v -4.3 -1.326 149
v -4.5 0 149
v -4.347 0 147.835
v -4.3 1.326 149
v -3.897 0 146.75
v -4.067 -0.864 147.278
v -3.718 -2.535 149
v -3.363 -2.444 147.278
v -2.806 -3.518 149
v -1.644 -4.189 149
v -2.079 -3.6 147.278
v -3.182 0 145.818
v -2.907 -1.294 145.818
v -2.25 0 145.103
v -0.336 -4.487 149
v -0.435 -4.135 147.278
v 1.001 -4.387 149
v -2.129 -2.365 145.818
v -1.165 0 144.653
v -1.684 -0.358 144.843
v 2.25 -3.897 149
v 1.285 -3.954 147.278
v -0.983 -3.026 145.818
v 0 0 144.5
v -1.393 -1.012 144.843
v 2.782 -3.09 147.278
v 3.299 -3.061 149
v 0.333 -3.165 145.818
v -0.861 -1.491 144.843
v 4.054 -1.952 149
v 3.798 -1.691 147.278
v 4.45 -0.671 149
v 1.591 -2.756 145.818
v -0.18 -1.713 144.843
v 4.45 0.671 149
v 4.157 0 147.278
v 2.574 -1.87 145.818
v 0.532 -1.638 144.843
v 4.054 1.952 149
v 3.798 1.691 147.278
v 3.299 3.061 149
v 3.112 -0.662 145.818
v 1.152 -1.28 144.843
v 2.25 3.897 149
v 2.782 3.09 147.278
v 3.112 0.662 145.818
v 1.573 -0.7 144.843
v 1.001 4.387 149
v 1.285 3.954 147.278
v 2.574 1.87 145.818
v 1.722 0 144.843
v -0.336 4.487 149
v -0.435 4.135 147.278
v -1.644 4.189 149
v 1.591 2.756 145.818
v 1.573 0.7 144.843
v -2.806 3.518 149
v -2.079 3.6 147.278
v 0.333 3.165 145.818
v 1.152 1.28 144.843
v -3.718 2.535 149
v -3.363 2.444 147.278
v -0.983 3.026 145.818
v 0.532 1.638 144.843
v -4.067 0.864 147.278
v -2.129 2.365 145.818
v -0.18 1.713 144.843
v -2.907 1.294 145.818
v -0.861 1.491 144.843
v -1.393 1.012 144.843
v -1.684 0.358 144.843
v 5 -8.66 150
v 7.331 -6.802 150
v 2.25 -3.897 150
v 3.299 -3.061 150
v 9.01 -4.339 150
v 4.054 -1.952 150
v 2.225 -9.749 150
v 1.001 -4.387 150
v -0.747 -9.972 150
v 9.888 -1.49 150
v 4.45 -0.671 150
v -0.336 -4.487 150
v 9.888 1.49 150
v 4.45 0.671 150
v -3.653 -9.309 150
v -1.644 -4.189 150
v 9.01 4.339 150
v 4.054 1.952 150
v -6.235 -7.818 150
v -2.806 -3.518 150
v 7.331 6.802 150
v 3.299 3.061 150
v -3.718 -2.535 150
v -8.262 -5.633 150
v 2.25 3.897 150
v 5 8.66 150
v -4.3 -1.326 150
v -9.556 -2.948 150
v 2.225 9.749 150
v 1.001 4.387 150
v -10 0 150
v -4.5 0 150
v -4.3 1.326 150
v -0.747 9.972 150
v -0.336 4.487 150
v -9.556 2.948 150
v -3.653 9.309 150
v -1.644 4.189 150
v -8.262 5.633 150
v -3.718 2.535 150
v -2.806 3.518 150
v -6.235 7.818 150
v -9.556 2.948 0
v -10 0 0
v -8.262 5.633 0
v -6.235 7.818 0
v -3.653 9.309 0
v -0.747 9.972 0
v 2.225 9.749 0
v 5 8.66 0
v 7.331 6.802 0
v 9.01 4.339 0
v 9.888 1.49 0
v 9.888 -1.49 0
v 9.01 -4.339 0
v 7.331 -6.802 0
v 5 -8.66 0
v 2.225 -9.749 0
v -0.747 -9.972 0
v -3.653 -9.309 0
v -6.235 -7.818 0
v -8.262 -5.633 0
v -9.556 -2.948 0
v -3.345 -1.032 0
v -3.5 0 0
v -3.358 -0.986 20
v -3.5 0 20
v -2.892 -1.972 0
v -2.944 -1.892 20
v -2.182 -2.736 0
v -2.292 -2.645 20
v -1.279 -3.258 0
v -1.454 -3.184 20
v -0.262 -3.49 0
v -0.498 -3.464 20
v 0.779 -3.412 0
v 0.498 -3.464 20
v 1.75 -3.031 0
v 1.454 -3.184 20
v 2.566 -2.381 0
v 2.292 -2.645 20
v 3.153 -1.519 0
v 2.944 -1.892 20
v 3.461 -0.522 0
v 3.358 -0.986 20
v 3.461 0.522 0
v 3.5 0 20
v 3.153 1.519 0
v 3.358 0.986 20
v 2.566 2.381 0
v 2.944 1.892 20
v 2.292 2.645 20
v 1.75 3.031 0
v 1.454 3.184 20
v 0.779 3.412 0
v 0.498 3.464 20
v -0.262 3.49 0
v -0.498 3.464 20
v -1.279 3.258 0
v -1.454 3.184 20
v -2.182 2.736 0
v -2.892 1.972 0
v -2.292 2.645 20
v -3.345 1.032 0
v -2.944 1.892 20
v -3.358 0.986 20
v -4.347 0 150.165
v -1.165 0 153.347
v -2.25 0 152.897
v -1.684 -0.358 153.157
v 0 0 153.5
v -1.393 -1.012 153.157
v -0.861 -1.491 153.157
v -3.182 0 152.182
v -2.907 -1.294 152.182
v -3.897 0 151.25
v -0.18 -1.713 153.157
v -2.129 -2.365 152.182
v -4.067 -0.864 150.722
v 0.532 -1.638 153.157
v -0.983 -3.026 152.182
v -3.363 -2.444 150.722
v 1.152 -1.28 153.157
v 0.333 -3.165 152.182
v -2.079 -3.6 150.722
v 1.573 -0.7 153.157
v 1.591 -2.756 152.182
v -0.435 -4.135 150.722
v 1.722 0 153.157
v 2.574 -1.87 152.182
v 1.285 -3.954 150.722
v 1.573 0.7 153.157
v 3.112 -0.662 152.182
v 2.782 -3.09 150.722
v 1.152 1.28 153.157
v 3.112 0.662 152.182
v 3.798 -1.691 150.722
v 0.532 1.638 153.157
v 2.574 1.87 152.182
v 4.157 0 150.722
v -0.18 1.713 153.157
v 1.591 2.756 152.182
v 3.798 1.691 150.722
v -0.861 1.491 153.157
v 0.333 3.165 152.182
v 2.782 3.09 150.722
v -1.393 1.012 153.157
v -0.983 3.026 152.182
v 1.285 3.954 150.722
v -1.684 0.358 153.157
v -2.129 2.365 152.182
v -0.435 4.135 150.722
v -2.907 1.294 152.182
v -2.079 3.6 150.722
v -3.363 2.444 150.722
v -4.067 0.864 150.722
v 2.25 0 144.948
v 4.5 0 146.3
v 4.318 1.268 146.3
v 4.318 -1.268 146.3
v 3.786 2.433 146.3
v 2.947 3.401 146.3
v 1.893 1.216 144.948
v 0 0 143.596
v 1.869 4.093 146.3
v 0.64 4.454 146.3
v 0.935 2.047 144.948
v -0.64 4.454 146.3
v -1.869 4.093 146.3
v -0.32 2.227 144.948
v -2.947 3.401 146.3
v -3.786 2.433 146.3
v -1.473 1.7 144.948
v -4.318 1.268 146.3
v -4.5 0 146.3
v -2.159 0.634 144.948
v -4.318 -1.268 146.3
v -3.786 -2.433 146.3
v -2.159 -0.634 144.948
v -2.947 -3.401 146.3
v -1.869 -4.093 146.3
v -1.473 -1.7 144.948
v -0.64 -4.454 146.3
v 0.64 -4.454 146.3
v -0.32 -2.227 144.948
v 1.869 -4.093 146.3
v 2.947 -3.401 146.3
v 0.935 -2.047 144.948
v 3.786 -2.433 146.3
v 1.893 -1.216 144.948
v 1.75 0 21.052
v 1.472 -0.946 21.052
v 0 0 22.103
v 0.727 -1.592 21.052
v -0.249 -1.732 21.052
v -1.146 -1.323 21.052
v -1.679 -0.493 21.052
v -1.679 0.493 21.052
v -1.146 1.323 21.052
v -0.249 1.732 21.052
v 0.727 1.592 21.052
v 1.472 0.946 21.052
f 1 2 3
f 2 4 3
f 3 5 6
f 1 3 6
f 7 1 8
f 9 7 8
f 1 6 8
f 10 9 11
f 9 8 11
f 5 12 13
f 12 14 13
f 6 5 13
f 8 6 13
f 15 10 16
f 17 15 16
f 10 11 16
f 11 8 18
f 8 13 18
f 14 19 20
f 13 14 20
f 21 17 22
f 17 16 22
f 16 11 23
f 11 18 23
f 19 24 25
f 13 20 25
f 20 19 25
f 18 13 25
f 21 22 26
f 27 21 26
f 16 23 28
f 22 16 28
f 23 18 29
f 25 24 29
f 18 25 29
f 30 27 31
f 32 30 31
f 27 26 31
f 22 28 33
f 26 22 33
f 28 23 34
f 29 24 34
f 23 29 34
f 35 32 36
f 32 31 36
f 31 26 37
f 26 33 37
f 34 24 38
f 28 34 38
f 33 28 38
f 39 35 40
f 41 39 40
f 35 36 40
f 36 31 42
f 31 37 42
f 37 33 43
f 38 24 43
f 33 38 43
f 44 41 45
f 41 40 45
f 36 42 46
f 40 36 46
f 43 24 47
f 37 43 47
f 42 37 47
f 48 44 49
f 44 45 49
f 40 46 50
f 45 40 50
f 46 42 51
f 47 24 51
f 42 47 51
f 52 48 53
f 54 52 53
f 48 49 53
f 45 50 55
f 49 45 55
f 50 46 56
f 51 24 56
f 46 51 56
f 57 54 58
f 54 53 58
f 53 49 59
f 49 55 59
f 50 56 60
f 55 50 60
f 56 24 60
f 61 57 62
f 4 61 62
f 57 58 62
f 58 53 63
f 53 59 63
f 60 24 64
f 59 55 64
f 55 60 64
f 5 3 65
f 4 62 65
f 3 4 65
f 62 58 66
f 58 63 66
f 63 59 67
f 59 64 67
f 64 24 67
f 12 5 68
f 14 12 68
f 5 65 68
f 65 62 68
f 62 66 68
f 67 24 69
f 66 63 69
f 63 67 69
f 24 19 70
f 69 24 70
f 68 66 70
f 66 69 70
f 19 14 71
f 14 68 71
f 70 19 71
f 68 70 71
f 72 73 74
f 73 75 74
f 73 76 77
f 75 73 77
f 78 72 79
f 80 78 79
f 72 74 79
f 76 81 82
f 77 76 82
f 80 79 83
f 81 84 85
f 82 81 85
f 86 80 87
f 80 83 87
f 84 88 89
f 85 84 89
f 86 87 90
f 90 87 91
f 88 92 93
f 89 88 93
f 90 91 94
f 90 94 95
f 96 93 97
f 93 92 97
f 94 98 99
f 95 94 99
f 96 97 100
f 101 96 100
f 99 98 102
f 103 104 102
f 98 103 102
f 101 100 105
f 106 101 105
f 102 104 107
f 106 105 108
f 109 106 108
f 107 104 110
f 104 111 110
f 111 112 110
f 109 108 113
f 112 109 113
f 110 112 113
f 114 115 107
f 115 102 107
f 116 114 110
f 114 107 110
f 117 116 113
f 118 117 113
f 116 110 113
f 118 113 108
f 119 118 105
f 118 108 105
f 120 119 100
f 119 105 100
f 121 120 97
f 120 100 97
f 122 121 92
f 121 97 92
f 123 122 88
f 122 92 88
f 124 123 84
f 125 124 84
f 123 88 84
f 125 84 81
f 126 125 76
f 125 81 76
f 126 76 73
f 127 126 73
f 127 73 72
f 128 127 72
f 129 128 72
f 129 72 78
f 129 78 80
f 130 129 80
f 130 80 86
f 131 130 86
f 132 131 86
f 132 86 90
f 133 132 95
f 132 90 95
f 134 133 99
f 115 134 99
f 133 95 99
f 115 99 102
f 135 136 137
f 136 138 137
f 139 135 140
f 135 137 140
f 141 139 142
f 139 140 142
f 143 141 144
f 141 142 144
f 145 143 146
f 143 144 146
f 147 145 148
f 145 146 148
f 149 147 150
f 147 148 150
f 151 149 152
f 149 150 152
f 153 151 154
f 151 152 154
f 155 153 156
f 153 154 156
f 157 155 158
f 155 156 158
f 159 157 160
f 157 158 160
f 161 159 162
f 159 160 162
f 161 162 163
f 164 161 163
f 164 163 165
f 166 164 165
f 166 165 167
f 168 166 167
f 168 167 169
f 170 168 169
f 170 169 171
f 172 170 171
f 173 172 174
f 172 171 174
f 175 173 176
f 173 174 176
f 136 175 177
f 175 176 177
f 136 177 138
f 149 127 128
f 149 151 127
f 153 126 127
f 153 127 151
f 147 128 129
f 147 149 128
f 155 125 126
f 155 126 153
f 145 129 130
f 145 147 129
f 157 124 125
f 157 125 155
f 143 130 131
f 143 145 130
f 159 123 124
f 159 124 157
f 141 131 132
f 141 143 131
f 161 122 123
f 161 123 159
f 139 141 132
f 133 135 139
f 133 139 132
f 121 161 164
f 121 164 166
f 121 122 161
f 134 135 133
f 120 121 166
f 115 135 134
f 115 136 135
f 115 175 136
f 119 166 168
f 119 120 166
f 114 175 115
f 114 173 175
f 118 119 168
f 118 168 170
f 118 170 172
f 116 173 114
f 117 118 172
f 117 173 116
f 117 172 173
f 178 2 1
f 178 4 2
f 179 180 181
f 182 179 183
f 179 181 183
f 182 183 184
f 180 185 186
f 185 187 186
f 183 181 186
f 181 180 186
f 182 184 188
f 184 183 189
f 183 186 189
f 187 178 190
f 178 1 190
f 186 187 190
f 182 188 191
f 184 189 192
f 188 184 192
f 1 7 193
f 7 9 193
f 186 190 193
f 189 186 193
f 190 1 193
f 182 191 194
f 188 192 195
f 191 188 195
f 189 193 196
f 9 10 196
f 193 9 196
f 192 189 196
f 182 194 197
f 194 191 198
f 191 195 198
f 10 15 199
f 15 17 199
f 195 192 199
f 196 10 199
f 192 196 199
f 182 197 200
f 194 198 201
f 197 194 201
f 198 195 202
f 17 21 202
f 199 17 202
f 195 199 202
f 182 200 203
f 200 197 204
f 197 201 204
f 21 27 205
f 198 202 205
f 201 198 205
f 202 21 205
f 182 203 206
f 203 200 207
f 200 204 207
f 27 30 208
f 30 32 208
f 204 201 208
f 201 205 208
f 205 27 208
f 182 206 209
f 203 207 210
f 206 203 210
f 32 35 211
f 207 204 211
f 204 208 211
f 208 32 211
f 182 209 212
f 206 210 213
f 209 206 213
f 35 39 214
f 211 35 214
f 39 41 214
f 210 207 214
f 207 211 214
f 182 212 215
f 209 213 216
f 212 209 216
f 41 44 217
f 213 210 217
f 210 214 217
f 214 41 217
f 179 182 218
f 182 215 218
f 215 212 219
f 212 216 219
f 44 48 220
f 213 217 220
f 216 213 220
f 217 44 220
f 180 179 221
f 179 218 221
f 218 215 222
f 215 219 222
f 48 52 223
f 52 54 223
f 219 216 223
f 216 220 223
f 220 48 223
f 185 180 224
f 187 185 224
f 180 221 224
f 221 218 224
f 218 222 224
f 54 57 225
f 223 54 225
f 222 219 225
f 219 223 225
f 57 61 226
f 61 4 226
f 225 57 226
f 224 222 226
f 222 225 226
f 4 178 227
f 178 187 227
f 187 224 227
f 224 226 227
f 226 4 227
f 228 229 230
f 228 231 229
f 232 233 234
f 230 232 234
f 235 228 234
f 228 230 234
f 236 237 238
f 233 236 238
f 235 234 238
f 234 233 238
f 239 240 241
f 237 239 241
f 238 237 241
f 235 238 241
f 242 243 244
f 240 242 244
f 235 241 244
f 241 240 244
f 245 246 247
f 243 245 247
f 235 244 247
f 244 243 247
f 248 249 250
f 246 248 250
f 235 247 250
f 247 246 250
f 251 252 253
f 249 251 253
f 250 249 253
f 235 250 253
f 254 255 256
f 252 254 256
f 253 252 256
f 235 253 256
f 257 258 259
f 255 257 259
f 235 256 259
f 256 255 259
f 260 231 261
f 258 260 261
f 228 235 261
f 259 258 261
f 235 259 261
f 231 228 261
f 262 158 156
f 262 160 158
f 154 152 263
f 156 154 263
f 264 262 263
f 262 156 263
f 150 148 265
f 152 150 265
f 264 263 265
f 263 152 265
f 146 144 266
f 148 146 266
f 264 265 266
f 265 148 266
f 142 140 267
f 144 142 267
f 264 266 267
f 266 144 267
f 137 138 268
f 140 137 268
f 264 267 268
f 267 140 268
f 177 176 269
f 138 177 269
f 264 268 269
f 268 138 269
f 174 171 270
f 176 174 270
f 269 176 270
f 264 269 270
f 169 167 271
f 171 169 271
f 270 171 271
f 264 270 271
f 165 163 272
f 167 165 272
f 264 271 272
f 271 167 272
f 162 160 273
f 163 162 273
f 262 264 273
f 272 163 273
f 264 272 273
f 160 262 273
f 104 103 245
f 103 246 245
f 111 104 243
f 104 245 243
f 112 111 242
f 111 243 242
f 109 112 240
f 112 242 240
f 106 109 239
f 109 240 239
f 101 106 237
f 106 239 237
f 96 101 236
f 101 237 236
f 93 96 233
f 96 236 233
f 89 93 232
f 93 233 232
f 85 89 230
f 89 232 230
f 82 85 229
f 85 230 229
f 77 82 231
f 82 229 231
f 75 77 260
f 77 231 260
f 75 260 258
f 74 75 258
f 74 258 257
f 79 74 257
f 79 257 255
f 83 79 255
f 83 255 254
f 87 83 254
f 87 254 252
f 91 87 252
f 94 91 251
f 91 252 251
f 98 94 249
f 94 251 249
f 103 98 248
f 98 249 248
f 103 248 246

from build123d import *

# Parameters (mm, degrees)
F0_W     = 10
F0_H     = 150
F3_D     = 9
F3_DEPTH = 3.7
F3_TIP   = 2.7038727856
F5_D     = 7
F5_DEPTH = 20
F5_TIP   = 2.1030121666


with BuildPart() as f1:
    # F0 (on Front) → F1 (revolve)
    with BuildSketch(Plane.XZ):
        with Locations((-5, 75)):
            Rectangle(F0_W, F0_H)
    revolve(axis=Axis((0, 0, 46.3739156723), (0, 0, -1)))

    # F3
    with Locations(Plane.XY.offset(150)):
        with Locations((0, 0)):
            Hole(F3_D / 2, depth=F3_DEPTH)
            with Locations((0, 0, -(F3_DEPTH + F3_TIP / 2))):  # 118° drill point
                Cone(0, F3_D / 2, F3_TIP, mode=Mode.SUBTRACT)

    # F5
    with Locations(Plane(origin=(0, 0, 0), x_dir=(1, 0, 0), z_dir=(0, 0, -1))):
        with Locations((0, 0)):
            Hole(F5_D / 2, depth=F5_DEPTH)
            with Locations((0, 0, -(F5_DEPTH + F5_TIP / 2))):  # 118° drill point
                Cone(0, F5_D / 2, F5_TIP, mode=Mode.SUBTRACT)


with BuildPart() as f7:
    # F6 (on Front) → F7 (revolve)
    with BuildSketch(Plane.XZ):
        with BuildLine():
            Line((0, 144.5), (0, 153.5))
            ThreePointArc((0, 153.5), (-3.1819805153, 152.1819805153), (-4.5, 149))
            ThreePointArc((-4.5, 149), (-3.1819805153, 145.8180194847), (0, 144.5))
        make_face()
    revolve(axis=Axis((0, 0, 149), (0, 0, 1)))


solid = Compound([f1.part, f7.part])
